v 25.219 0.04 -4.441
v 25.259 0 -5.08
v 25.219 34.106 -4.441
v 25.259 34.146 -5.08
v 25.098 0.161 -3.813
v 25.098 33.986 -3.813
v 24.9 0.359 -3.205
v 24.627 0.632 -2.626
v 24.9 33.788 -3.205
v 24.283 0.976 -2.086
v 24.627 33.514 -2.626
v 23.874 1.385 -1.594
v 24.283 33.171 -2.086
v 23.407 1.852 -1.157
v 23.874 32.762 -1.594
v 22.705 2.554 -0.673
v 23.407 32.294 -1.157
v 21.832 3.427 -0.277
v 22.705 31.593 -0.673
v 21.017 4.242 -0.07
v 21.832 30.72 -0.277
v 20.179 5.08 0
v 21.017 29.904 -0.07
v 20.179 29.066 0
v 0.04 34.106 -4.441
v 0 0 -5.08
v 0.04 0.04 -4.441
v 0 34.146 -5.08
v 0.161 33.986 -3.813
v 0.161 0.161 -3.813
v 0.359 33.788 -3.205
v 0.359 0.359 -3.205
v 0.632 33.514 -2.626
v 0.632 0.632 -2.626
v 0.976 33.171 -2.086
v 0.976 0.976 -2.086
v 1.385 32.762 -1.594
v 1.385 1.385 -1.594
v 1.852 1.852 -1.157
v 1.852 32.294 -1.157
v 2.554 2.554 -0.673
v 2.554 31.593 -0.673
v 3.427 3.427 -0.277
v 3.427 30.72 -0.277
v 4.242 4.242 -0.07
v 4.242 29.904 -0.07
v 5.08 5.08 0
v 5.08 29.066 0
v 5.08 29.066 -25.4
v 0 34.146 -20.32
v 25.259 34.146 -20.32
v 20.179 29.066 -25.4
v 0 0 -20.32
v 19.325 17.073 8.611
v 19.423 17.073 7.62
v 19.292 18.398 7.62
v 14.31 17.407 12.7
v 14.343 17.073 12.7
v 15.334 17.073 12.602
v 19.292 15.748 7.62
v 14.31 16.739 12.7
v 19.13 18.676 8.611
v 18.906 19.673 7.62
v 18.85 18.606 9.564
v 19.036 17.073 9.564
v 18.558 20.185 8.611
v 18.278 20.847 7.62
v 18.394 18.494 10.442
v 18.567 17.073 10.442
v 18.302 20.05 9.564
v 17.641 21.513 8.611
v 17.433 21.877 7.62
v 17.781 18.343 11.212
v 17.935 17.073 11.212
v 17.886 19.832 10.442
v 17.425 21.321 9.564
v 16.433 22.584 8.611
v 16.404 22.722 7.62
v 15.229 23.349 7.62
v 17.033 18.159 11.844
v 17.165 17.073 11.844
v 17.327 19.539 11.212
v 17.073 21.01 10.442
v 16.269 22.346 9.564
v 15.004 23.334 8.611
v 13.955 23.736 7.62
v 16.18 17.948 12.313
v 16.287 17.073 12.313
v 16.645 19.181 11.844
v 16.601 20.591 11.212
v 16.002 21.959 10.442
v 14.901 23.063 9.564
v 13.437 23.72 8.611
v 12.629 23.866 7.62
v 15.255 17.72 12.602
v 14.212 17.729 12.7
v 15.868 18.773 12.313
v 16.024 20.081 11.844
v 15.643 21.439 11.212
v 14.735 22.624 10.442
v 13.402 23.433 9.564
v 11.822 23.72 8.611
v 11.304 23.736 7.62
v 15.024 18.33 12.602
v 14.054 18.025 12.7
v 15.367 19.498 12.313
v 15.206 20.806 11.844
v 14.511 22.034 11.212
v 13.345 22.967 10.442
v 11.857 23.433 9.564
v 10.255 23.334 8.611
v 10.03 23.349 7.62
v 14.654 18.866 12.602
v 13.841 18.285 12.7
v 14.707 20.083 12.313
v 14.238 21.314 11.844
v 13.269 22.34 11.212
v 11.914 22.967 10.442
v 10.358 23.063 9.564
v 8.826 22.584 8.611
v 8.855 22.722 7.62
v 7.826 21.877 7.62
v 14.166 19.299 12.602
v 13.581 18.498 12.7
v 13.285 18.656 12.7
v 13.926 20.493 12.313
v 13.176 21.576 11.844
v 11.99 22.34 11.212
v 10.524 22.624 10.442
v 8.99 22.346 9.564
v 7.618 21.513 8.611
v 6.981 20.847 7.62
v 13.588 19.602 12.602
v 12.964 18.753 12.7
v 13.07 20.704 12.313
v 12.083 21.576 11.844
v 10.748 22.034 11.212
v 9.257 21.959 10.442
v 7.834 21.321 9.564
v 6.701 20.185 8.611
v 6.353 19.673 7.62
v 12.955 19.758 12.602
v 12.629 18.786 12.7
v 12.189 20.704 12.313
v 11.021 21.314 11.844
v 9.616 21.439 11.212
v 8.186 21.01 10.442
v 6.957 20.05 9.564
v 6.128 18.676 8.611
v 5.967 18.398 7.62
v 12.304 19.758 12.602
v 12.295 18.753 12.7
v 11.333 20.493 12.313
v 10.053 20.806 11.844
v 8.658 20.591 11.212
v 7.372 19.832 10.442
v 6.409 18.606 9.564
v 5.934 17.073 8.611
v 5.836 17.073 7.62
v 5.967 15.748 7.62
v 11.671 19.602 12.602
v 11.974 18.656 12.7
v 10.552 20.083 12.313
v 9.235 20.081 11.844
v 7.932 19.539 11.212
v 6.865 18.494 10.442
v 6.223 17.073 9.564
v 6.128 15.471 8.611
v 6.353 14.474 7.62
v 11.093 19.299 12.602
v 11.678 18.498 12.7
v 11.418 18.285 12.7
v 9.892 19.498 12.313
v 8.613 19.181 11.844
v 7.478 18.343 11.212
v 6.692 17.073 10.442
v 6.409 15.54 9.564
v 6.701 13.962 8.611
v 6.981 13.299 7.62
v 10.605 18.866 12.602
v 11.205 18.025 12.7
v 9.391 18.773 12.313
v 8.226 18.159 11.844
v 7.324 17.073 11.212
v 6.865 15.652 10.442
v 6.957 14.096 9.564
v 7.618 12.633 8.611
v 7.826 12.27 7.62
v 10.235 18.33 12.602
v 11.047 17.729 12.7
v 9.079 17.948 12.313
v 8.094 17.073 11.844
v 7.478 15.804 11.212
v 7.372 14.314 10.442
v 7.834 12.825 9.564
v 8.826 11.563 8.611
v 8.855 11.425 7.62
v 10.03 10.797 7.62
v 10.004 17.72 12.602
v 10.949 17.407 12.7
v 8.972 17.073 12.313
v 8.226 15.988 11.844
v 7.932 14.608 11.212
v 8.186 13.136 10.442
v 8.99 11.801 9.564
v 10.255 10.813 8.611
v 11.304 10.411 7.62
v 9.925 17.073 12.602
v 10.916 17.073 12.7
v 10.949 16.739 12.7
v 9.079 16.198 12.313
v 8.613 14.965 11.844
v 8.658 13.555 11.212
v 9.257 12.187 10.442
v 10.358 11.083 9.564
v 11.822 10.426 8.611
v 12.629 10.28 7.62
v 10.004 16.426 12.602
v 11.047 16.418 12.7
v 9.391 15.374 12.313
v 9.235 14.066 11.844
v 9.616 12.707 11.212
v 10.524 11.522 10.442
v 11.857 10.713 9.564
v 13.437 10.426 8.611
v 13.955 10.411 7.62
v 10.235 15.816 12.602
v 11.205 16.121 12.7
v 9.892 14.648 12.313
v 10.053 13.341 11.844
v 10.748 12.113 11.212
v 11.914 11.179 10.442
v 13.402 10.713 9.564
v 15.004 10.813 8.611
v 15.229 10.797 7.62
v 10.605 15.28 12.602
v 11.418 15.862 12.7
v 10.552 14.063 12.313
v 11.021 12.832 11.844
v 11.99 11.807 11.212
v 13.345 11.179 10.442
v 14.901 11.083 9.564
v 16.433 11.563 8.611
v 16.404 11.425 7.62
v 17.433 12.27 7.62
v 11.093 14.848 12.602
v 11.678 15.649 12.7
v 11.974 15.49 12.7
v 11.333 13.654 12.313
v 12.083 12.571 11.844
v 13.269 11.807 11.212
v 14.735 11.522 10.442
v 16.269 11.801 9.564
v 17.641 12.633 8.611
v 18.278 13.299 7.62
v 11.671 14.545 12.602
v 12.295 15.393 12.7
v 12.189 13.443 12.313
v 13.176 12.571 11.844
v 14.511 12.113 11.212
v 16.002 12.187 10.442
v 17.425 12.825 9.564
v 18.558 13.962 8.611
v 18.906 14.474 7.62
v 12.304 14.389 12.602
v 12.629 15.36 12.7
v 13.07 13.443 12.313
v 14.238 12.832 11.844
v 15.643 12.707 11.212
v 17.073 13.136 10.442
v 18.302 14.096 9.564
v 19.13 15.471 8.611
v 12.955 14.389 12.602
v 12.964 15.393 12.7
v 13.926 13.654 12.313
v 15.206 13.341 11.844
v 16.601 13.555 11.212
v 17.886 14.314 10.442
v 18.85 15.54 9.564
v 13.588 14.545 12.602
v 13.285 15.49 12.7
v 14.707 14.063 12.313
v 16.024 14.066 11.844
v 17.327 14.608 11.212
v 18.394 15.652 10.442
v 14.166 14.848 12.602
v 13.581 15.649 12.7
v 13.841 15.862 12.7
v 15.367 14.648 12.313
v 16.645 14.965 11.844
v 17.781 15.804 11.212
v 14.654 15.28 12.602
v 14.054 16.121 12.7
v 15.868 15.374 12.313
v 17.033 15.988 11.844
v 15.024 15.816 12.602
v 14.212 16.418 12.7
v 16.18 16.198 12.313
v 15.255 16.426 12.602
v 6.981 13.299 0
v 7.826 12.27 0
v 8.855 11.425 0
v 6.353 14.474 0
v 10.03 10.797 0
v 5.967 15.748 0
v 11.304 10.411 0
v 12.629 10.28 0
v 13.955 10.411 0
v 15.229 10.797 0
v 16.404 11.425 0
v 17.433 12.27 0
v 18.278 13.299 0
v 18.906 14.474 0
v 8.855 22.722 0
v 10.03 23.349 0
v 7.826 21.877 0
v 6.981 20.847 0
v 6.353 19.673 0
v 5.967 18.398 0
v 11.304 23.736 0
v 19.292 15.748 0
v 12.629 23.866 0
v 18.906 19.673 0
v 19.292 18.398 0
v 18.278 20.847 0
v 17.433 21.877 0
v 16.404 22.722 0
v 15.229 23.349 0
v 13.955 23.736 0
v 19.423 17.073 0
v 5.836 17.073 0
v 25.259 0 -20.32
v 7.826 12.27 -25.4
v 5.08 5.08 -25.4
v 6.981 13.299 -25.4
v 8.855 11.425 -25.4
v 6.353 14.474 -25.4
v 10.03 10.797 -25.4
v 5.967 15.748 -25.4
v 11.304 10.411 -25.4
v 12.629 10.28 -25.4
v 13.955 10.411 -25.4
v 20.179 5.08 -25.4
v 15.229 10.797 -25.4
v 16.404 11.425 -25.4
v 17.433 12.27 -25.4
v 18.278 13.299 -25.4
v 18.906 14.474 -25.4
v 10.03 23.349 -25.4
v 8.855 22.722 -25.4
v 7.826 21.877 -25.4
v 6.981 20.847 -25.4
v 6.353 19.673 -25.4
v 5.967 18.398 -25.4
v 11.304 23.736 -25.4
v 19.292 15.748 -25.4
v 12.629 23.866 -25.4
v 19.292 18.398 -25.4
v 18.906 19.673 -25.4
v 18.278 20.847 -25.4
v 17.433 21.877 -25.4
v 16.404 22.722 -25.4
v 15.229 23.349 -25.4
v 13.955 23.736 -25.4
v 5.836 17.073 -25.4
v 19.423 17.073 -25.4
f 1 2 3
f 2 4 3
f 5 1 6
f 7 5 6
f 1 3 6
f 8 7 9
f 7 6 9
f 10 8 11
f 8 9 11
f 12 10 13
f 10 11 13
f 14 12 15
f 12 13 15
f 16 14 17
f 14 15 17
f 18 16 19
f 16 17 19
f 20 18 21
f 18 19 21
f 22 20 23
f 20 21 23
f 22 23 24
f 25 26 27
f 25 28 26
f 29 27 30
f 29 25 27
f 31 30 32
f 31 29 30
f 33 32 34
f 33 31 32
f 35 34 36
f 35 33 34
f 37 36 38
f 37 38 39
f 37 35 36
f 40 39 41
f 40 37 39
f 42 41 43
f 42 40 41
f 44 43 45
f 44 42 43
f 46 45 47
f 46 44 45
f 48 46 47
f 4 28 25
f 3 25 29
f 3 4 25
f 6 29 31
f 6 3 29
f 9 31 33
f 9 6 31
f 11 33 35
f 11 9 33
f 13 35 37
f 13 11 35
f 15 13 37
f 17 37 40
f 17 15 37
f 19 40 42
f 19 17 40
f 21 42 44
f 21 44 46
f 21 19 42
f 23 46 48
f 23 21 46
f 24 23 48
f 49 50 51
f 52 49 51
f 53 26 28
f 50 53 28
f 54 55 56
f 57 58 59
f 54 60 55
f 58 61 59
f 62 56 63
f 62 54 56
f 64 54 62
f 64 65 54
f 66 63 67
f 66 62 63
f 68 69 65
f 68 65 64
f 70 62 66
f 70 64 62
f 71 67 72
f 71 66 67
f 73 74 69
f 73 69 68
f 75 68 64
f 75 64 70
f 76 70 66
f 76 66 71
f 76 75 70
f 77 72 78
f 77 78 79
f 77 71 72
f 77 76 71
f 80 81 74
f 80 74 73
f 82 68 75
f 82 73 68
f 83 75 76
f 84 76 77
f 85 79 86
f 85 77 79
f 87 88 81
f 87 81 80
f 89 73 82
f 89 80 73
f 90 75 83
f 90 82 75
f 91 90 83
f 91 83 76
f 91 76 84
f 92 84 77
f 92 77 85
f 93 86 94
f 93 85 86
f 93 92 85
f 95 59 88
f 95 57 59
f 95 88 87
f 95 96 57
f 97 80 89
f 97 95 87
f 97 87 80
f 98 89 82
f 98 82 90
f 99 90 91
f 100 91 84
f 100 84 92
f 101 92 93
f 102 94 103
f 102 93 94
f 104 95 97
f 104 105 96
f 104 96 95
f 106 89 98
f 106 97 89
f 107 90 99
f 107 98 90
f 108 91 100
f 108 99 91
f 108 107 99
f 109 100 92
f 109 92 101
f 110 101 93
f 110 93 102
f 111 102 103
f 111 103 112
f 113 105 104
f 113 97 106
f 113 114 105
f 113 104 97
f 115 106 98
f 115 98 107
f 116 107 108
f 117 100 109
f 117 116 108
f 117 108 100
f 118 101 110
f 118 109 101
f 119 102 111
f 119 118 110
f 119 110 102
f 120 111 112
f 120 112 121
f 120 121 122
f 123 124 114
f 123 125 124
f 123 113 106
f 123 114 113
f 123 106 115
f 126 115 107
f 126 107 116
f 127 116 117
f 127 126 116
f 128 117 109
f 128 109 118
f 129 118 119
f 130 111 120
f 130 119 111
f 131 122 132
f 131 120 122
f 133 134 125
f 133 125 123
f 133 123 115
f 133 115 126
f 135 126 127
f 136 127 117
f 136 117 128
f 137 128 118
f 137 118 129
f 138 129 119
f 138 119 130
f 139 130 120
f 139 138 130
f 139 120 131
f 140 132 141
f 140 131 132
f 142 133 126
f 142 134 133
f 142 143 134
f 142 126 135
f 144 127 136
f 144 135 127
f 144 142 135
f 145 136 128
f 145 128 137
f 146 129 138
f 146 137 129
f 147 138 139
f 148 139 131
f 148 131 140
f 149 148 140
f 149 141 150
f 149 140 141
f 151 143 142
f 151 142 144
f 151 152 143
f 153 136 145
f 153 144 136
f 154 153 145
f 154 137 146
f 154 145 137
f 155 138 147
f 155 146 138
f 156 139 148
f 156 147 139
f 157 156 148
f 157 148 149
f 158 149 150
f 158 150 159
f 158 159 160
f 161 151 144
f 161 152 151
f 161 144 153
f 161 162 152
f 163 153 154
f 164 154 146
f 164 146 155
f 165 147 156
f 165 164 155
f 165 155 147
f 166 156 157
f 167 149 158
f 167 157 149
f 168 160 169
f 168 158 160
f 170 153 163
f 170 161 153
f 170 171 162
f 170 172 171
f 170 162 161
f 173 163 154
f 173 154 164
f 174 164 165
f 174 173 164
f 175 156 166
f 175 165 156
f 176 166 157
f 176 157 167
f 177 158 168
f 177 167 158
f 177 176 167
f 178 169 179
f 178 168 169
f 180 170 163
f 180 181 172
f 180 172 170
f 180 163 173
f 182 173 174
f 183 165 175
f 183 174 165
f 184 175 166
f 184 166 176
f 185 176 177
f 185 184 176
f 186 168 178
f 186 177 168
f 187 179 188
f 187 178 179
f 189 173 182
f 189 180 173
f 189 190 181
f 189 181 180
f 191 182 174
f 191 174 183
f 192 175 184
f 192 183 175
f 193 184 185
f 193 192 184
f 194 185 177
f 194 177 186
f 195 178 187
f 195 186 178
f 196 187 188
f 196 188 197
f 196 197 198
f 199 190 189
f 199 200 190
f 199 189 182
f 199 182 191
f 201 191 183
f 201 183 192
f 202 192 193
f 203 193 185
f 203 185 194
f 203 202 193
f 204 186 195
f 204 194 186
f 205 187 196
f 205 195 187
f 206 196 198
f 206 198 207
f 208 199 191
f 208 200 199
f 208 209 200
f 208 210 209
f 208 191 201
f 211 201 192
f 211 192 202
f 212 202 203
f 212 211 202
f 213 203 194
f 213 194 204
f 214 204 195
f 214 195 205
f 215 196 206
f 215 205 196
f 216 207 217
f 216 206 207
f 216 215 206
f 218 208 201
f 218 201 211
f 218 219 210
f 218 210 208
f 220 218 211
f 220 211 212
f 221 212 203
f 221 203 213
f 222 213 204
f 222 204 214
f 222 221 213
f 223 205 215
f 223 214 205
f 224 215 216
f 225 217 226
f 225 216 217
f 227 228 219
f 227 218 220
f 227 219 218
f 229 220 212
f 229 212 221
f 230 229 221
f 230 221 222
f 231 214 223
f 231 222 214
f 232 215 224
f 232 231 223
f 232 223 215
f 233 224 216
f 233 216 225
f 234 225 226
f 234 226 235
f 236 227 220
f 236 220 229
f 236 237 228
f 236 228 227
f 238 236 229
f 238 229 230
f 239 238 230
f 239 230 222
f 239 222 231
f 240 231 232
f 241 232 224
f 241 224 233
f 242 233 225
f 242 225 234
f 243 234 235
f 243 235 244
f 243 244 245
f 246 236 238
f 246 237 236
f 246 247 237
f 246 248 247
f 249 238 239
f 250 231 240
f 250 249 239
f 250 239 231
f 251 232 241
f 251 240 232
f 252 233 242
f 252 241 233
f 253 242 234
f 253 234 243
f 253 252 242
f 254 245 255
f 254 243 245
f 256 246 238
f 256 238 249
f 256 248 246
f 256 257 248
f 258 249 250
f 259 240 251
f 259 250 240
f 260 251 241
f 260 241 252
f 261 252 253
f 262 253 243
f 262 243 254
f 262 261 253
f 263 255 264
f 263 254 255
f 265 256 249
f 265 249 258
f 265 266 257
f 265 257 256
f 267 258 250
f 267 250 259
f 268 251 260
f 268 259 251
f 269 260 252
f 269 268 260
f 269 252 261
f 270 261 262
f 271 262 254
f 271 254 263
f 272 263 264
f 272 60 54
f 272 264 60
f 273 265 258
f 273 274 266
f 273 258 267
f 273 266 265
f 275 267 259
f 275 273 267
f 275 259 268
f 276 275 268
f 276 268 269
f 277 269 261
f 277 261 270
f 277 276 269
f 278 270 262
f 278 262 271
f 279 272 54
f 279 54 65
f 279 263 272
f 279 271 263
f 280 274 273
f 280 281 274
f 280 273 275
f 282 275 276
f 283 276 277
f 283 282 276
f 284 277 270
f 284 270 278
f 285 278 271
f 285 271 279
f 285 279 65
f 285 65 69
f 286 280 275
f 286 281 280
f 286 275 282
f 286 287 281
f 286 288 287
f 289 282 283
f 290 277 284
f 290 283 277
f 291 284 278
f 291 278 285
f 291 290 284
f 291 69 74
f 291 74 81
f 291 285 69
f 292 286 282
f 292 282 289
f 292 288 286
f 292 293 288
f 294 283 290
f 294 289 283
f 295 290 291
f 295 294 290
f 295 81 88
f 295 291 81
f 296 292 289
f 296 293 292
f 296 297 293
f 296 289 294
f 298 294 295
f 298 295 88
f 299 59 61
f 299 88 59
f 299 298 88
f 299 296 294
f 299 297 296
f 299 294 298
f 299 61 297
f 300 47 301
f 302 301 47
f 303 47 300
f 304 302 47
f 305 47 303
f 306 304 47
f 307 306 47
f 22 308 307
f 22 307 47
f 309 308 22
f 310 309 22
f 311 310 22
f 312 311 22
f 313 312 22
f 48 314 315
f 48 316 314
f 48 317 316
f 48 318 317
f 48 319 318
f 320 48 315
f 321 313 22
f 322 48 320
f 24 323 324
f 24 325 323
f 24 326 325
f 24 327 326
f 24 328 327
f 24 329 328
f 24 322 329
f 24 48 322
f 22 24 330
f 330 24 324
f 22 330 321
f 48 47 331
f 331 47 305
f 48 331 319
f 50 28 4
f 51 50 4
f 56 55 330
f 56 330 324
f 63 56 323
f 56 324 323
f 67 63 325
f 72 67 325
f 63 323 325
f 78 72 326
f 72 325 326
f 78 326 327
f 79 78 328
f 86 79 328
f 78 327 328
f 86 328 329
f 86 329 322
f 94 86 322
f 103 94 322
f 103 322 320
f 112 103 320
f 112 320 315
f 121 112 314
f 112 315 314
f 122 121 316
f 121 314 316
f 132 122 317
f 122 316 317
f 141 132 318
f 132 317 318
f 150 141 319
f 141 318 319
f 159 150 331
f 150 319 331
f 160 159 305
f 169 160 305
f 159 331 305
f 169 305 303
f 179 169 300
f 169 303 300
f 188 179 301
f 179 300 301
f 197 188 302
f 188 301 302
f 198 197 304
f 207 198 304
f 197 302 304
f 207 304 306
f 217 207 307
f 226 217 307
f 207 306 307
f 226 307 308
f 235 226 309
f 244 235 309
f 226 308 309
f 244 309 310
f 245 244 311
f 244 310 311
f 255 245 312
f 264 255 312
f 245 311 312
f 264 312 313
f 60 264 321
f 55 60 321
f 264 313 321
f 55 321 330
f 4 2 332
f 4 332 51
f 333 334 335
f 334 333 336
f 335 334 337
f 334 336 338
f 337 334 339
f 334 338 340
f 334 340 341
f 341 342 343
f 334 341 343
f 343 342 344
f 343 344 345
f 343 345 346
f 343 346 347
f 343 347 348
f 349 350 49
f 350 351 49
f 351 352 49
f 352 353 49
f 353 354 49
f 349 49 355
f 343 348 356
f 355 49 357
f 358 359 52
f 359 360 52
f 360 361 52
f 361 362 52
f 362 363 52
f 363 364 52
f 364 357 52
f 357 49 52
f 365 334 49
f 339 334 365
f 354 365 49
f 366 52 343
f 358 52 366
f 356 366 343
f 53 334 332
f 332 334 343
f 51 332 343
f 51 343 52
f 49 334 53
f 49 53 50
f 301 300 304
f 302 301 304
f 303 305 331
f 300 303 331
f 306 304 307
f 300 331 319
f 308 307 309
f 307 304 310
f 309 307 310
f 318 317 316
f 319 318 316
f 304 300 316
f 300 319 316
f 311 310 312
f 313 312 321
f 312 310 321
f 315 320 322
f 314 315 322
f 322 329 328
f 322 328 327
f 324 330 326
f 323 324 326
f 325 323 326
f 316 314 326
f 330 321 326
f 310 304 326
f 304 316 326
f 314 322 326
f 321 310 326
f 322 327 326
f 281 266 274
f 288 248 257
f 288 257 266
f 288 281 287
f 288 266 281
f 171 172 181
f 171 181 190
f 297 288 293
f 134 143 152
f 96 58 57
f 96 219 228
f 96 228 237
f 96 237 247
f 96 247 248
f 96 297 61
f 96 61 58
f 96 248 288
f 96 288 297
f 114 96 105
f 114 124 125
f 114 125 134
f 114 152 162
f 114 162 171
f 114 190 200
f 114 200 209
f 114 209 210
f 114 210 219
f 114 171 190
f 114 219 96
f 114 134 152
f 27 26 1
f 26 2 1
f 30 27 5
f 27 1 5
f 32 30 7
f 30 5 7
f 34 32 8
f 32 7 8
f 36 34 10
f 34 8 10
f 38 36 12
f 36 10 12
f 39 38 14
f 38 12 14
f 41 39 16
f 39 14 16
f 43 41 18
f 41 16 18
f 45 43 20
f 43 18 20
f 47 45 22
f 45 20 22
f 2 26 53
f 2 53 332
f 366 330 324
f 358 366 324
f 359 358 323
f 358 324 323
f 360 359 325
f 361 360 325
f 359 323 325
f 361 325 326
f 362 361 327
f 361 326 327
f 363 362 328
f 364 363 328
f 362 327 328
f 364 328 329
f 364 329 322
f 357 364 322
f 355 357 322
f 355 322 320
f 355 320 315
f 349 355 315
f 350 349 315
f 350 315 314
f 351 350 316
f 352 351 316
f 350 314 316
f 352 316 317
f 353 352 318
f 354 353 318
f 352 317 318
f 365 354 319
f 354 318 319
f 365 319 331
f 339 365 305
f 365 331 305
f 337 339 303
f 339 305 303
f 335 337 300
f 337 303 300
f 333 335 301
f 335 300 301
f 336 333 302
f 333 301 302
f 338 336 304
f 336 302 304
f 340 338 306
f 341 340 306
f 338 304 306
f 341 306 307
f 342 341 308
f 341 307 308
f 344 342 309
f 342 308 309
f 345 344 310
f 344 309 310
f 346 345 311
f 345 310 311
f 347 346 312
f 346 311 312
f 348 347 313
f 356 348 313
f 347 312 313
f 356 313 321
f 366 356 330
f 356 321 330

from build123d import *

# Parameters (mm, degrees)
F0_R     = 6.793202
F1_DEPTH = 12.7
F0_W     = 25.258934
F0_H     = 34.146361
F2_DEPTH = 25.4
F3_R     = 5.08
F3_2_R   = 5.08
F4_SIZE  = 5.08


with BuildPart() as f1:
    # F0 (on Top) → F1 (new body)
    with BuildSketch(Plane.XY):
        with Locations((12.629467, 17.073181)):
            Circle(F0_R)
    extrude(amount=F1_DEPTH)

    # F3
    f3_edges = [f1.edges().sort_by_distance(p)[0] for p in [
        (5.836266, 17.073181, 12.7),
    ]]
    fillet(f3_edges, radius=F3_R)


with BuildPart() as f2:
    # F0 (on Top) → F2 (new body)
    with BuildSketch(Plane.XY):
        with Locations((12.629467, 17.07318)):
            Rectangle(F0_W, F0_H)
        with Locations((12.629467, 17.073181)):
            Circle(F0_R, mode=Mode.SUBTRACT)
    extrude(amount=-F2_DEPTH)

    # F3#2
    f3_2_edges = [f2.edges().sort_by_distance(p)[0] for p in [
        (25.258934, 17.073181, 0),
        (12.629467, 34.146361, 0),
        (0, 17.073181, 0),
        (12.629467, 0, 0),
    ]]
    fillet(f3_2_edges, radius=F3_2_R)

    # F4
    f4_edges = [f2.edges().sort_by_distance(p)[0] for p in [
        (0, 17.073181, -25.4),
        (12.629467, 34.146361, -25.4),
        (25.258934, 17.073181, -25.4),
        (12.629467, 0, -25.4),
    ]]
    chamfer(f4_edges, length=F4_SIZE)


solid = Compound([f1.part, f2.part])
